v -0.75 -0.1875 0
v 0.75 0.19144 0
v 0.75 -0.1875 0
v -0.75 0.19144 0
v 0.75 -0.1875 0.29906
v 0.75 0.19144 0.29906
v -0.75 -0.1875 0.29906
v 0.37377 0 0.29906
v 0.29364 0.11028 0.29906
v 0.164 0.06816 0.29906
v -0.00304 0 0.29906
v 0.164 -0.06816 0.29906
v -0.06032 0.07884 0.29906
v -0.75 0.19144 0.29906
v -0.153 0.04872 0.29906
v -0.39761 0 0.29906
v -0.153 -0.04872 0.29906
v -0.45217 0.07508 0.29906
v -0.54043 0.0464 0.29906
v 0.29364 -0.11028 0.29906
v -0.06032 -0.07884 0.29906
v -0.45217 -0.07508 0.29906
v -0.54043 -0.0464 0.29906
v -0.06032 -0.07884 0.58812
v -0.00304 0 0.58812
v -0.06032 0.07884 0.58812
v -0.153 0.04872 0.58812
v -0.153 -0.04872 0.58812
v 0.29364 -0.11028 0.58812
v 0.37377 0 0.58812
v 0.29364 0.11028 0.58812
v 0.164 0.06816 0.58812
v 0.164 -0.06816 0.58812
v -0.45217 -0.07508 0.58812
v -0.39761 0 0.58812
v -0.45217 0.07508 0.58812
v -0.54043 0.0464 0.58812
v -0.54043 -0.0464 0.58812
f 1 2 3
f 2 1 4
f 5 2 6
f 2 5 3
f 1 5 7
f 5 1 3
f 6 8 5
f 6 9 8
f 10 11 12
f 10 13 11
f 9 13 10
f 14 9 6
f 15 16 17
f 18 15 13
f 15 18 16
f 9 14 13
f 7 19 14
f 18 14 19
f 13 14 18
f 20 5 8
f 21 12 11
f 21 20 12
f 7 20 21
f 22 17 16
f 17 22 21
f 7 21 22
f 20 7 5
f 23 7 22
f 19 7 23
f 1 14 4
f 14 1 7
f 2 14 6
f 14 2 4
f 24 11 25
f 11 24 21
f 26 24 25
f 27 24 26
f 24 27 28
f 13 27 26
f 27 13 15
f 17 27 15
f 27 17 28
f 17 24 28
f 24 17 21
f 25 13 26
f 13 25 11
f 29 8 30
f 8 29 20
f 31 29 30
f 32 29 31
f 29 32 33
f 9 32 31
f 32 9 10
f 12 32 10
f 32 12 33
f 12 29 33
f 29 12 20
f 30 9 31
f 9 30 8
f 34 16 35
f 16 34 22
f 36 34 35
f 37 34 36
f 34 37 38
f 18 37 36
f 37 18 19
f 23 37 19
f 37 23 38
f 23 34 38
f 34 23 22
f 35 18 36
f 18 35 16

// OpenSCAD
EPS = 0.01;

module sketch0() {
    translate([-0.75, -0.1875, 0])
    linear_extrude(height=0.2890625 + EPS)
    polygon(points=[[1.5, 0], [1.5, 0.37894736842105264], [0, 0.37894736842105264], [0, 0]]);
}

module sketch1() {
    translate([-0.0859375, 0, 0.2890625])
    linear_extrude(height=0.2890625 + EPS)
    circle(r=0.08289473684210526);
}

module sketch2() {
    translate([0.2578125, 0, 0.2890625])
    linear_extrude(height=0.2890625 + EPS)
    circle(r=0.11595394736842105);
}

module sketch3() {
    translate([-0.4765625, 0, 0.2890625])
    linear_extrude(height=0.2890625 + EPS)
    circle(r=0.07894736842105263);
}

union() {
    sketch0();
    sketch1();
    sketch2();
    sketch3();
}
